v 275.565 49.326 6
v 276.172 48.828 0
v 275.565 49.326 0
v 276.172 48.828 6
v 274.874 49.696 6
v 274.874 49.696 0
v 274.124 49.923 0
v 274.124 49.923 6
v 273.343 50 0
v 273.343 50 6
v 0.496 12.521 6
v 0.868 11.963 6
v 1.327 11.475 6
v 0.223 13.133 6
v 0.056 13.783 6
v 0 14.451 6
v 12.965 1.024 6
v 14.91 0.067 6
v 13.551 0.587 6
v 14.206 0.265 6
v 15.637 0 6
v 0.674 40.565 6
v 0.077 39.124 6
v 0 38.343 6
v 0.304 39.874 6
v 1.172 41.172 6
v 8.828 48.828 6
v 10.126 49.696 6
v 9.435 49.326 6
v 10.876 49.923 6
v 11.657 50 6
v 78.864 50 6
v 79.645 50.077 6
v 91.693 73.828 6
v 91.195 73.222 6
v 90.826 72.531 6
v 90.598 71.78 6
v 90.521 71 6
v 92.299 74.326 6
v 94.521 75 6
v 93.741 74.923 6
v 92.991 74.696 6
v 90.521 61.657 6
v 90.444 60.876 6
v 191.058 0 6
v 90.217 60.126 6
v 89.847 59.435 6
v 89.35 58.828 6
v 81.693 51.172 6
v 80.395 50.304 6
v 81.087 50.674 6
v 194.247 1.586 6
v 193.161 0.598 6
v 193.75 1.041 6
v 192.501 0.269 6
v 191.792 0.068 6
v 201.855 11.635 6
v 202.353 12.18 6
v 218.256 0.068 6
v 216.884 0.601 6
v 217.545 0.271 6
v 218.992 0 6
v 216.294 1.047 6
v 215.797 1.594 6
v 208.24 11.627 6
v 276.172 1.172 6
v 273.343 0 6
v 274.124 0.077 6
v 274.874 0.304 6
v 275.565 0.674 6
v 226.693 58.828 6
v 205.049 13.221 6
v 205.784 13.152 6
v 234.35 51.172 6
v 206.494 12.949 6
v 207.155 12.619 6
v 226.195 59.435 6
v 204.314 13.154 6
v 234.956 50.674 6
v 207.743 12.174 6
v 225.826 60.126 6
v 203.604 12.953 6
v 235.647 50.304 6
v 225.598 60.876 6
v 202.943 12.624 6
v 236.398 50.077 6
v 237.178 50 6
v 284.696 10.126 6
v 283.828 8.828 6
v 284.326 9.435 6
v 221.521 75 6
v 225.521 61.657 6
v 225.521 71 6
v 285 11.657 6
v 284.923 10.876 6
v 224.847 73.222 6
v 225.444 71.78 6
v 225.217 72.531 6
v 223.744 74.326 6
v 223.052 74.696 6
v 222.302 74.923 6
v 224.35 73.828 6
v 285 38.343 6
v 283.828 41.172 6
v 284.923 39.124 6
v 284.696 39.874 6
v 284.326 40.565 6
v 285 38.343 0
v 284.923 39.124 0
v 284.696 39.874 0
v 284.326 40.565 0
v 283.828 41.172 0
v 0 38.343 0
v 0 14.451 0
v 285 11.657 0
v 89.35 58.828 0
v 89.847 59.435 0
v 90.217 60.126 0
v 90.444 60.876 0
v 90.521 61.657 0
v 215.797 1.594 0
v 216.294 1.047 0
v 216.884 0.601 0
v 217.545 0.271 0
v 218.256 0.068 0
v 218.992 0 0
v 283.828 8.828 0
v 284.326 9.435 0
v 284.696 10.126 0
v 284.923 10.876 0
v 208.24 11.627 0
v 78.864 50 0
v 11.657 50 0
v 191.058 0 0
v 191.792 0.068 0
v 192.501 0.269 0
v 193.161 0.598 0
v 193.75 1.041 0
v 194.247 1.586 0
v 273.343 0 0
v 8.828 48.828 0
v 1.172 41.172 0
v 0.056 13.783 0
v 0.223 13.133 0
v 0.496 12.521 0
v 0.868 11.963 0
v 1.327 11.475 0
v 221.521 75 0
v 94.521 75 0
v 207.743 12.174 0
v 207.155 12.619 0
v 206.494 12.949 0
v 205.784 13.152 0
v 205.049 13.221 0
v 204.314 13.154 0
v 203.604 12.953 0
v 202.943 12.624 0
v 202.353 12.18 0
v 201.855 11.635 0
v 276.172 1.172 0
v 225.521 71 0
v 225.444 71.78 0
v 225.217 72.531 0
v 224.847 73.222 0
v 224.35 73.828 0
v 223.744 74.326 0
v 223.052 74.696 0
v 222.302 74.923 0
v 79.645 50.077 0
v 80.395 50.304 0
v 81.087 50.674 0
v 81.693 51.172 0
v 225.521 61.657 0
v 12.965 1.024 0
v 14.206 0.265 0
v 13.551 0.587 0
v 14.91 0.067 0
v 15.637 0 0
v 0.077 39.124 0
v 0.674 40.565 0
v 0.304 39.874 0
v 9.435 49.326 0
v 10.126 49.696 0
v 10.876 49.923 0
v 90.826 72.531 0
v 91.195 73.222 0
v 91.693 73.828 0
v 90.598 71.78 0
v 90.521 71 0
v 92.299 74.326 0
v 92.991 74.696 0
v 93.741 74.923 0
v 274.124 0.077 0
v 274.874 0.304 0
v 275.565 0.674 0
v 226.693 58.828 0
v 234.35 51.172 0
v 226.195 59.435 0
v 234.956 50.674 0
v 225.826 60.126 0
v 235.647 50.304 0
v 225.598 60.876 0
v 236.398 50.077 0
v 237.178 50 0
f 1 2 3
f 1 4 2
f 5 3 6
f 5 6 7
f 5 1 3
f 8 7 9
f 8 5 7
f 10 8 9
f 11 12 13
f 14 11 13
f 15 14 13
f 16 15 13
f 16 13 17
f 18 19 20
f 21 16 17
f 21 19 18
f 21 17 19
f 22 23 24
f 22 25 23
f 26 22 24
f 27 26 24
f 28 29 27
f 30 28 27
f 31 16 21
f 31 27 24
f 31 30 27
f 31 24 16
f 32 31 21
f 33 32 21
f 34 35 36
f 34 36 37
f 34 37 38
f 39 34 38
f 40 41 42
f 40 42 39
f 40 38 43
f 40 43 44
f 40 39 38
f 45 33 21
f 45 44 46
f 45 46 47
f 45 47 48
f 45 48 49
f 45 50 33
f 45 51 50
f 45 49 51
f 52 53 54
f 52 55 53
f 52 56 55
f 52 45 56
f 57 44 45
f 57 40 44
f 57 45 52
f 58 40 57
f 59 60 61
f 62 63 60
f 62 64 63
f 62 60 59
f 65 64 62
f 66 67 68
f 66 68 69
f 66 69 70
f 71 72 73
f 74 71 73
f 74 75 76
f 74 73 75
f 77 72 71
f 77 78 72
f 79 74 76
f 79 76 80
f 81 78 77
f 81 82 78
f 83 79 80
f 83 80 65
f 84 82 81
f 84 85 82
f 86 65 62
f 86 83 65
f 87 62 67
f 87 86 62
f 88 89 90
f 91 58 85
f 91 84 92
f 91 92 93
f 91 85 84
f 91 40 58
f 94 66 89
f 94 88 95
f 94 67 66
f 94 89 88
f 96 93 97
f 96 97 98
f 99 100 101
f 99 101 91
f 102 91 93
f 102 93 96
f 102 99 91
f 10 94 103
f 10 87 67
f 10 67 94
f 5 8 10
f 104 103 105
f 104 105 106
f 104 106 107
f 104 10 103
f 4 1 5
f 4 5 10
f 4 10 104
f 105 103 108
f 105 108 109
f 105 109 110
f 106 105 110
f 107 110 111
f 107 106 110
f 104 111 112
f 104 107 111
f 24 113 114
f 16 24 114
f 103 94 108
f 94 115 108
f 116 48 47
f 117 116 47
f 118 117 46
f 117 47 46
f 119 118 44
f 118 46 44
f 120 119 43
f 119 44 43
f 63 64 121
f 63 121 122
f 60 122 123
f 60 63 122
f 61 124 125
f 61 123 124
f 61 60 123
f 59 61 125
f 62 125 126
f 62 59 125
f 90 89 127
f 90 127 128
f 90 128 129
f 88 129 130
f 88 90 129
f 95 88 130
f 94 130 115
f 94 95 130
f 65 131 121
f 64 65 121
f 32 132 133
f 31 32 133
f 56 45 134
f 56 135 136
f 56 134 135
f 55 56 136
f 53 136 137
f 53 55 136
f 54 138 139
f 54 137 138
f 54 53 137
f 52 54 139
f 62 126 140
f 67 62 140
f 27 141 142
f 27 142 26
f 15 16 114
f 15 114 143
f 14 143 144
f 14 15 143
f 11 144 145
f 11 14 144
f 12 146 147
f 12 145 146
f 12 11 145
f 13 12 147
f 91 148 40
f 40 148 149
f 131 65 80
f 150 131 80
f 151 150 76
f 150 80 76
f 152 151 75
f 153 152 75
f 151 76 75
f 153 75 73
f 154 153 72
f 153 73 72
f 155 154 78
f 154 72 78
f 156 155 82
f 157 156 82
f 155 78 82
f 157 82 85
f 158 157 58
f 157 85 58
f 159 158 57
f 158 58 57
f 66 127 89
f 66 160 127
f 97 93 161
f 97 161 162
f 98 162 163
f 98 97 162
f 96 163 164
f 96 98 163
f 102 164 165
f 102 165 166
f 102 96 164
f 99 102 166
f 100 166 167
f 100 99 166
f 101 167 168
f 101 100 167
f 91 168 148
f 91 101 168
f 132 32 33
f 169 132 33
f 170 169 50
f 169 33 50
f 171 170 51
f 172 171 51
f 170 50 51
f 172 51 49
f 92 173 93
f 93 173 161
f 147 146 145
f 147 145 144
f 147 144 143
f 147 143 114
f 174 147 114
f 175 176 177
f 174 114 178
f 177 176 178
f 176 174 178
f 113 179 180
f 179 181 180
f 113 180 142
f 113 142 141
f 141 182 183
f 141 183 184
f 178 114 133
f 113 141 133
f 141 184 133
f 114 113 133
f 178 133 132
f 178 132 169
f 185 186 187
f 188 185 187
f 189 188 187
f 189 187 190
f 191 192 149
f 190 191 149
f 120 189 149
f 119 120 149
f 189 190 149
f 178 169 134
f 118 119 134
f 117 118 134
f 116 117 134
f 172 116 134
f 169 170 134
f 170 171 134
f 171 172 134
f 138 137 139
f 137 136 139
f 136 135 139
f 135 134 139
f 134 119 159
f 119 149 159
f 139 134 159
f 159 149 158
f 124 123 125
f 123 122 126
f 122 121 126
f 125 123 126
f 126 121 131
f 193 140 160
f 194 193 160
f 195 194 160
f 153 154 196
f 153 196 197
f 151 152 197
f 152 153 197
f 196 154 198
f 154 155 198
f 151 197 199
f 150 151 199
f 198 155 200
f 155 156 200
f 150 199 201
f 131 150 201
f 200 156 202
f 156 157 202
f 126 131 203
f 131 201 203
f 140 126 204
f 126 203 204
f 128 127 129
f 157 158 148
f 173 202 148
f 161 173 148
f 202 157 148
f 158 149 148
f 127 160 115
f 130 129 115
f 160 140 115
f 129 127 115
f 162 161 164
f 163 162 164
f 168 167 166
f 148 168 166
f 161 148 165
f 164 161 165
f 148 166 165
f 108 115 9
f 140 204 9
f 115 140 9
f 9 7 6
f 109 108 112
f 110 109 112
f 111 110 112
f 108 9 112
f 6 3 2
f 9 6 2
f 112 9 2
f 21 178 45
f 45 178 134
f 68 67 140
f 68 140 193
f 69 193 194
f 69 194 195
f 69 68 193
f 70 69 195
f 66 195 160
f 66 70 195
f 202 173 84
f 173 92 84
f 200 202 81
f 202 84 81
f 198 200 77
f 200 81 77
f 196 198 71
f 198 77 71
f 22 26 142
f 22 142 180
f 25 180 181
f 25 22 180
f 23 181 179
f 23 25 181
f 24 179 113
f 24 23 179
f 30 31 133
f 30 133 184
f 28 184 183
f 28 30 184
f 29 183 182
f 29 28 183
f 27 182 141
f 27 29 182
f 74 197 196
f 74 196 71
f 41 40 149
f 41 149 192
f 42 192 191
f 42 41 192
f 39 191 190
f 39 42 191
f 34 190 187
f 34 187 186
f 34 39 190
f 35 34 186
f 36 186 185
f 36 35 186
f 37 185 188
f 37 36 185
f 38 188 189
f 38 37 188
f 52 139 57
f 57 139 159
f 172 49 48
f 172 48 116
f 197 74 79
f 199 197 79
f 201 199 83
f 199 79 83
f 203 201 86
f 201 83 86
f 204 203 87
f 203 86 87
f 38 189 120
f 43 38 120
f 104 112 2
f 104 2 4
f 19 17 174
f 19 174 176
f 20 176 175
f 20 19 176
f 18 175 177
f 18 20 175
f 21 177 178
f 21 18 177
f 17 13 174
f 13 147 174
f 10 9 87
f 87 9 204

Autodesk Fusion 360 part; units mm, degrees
sketch "Sketch1" plane through (0, 0, 0) normal (0, 0, 1) x (1, 0, 0)
  line L0 (0, 0) -> (285, 0)
  line L1 (285, 0) -> (285, 50)
  line L2 (285, 50) -> (0, 50)
  line L3 (0, 50) -> (0, 0)
  line L4 (90.5213, 50) -> (225.5213, 50)
  line L5 (225.5213, 50) -> (225.5213, 75)
  line L6 (225.5213, 75) -> (90.5213, 75)
  line L7 (90.5213, 75) -> (90.5213, 50)
  line L8 (216.9969, 0) -> (193.0469, 0)
  line L9 (202.6853, -0.0546) -> (207.3953, -0.0546)
  line L10 (193.0469, 0) -> (205.0617, 15.8707)
  line L11 (205.0438, 15.8707) -> (216.9969, 0)
  circle A0 centre (140.3583, 38.3038) radius 18.9
  circle A1 centre (102.5213, 63.5005) radius 3.5
  circle A2 centre (118.2718, 63.2499) radius 2.25
  line L12 (111.8584, 9.8039) -> (168.8584, 9.8039)
  line L13 (168.8584, 9.8039) -> (168.8584, 66.8039)
  line L14 (168.8584, 66.8039) -> (111.8584, 66.8039)
  line L15 (111.8584, 66.8039) -> (111.8584, 9.8039)
  line L16 (14.2106, -0.0951) -> (-24.7294, -0.0951)
  line L17 (-24.7294, -0.0951) -> (-10.5221, 12.6845)
  line L18 (-10.5221, 12.6845) -> (-0.0196, 12.6845)
  line L19 (-0.0196, 12.6845) -> (14.2106, -0.0951)
  dimension "d1" = 285
  dimension "d2" = 50
  dimension "d7" = 135
  dimension "d8" = 25
  dimension "d36" = 23.95
  dimension "d37" = 4.71
  dimension "d41" = 37.8
  dimension "d42" = 7
  dimension "d43" = 4.5
  dimension "d45" = 57
  dimension "d46" = 57
  dimension "d52" = 38.94
extrude "Extrude2" add sketch "Sketch1" along normal blind 6 contours L0 L1 L2 L3 L4 L10 L11 L12 L13 L15 L19 | L2 L4 L5 L6 L7 L13 L14 L15 | L2 L4 A0 L12 L13 L15 | L2 L4 A0 L13 L14 L15 | L2 L4 A0 | L2 L4 A0 | A1 | A2
chamfer "Chamfer9" distance 10 angle 45 5 edges at (285, 0, 3) (285, 50, 3) (225.5213, 50, 3) (90.5213, 50, 3) (0, 50, 3)
fillet "Fillet19" radius 4 17 edges at (216.9969, 0, 3) (193.0469, 0, 3) (205.0527, 15.8588, 3) (0, 12.667, 3) (14.1047, 0, 3) (0, 40, 3) (10, 50, 3) (90.5213, 60, 3) (80.5213, 50, 3) (225.5213, 60, 3) (235.5213, 50, 3) (275, 50, 3) (285, 40, 3) (285, 10, 3) (275, 0, 3) (90.5213, 75, 3) (225.5213, 75, 3)
equation "DBigHull = 3.78 cm"
equation "AvstandFraLangKantTilBigHull = 12.32 cm"
equation "motorfront = 56 mm"
equation "d41 = DBigHull"
equation "NEM23 = 57 mm"
equation "d45 = NEM23"
equation "d46 = NEM23"
